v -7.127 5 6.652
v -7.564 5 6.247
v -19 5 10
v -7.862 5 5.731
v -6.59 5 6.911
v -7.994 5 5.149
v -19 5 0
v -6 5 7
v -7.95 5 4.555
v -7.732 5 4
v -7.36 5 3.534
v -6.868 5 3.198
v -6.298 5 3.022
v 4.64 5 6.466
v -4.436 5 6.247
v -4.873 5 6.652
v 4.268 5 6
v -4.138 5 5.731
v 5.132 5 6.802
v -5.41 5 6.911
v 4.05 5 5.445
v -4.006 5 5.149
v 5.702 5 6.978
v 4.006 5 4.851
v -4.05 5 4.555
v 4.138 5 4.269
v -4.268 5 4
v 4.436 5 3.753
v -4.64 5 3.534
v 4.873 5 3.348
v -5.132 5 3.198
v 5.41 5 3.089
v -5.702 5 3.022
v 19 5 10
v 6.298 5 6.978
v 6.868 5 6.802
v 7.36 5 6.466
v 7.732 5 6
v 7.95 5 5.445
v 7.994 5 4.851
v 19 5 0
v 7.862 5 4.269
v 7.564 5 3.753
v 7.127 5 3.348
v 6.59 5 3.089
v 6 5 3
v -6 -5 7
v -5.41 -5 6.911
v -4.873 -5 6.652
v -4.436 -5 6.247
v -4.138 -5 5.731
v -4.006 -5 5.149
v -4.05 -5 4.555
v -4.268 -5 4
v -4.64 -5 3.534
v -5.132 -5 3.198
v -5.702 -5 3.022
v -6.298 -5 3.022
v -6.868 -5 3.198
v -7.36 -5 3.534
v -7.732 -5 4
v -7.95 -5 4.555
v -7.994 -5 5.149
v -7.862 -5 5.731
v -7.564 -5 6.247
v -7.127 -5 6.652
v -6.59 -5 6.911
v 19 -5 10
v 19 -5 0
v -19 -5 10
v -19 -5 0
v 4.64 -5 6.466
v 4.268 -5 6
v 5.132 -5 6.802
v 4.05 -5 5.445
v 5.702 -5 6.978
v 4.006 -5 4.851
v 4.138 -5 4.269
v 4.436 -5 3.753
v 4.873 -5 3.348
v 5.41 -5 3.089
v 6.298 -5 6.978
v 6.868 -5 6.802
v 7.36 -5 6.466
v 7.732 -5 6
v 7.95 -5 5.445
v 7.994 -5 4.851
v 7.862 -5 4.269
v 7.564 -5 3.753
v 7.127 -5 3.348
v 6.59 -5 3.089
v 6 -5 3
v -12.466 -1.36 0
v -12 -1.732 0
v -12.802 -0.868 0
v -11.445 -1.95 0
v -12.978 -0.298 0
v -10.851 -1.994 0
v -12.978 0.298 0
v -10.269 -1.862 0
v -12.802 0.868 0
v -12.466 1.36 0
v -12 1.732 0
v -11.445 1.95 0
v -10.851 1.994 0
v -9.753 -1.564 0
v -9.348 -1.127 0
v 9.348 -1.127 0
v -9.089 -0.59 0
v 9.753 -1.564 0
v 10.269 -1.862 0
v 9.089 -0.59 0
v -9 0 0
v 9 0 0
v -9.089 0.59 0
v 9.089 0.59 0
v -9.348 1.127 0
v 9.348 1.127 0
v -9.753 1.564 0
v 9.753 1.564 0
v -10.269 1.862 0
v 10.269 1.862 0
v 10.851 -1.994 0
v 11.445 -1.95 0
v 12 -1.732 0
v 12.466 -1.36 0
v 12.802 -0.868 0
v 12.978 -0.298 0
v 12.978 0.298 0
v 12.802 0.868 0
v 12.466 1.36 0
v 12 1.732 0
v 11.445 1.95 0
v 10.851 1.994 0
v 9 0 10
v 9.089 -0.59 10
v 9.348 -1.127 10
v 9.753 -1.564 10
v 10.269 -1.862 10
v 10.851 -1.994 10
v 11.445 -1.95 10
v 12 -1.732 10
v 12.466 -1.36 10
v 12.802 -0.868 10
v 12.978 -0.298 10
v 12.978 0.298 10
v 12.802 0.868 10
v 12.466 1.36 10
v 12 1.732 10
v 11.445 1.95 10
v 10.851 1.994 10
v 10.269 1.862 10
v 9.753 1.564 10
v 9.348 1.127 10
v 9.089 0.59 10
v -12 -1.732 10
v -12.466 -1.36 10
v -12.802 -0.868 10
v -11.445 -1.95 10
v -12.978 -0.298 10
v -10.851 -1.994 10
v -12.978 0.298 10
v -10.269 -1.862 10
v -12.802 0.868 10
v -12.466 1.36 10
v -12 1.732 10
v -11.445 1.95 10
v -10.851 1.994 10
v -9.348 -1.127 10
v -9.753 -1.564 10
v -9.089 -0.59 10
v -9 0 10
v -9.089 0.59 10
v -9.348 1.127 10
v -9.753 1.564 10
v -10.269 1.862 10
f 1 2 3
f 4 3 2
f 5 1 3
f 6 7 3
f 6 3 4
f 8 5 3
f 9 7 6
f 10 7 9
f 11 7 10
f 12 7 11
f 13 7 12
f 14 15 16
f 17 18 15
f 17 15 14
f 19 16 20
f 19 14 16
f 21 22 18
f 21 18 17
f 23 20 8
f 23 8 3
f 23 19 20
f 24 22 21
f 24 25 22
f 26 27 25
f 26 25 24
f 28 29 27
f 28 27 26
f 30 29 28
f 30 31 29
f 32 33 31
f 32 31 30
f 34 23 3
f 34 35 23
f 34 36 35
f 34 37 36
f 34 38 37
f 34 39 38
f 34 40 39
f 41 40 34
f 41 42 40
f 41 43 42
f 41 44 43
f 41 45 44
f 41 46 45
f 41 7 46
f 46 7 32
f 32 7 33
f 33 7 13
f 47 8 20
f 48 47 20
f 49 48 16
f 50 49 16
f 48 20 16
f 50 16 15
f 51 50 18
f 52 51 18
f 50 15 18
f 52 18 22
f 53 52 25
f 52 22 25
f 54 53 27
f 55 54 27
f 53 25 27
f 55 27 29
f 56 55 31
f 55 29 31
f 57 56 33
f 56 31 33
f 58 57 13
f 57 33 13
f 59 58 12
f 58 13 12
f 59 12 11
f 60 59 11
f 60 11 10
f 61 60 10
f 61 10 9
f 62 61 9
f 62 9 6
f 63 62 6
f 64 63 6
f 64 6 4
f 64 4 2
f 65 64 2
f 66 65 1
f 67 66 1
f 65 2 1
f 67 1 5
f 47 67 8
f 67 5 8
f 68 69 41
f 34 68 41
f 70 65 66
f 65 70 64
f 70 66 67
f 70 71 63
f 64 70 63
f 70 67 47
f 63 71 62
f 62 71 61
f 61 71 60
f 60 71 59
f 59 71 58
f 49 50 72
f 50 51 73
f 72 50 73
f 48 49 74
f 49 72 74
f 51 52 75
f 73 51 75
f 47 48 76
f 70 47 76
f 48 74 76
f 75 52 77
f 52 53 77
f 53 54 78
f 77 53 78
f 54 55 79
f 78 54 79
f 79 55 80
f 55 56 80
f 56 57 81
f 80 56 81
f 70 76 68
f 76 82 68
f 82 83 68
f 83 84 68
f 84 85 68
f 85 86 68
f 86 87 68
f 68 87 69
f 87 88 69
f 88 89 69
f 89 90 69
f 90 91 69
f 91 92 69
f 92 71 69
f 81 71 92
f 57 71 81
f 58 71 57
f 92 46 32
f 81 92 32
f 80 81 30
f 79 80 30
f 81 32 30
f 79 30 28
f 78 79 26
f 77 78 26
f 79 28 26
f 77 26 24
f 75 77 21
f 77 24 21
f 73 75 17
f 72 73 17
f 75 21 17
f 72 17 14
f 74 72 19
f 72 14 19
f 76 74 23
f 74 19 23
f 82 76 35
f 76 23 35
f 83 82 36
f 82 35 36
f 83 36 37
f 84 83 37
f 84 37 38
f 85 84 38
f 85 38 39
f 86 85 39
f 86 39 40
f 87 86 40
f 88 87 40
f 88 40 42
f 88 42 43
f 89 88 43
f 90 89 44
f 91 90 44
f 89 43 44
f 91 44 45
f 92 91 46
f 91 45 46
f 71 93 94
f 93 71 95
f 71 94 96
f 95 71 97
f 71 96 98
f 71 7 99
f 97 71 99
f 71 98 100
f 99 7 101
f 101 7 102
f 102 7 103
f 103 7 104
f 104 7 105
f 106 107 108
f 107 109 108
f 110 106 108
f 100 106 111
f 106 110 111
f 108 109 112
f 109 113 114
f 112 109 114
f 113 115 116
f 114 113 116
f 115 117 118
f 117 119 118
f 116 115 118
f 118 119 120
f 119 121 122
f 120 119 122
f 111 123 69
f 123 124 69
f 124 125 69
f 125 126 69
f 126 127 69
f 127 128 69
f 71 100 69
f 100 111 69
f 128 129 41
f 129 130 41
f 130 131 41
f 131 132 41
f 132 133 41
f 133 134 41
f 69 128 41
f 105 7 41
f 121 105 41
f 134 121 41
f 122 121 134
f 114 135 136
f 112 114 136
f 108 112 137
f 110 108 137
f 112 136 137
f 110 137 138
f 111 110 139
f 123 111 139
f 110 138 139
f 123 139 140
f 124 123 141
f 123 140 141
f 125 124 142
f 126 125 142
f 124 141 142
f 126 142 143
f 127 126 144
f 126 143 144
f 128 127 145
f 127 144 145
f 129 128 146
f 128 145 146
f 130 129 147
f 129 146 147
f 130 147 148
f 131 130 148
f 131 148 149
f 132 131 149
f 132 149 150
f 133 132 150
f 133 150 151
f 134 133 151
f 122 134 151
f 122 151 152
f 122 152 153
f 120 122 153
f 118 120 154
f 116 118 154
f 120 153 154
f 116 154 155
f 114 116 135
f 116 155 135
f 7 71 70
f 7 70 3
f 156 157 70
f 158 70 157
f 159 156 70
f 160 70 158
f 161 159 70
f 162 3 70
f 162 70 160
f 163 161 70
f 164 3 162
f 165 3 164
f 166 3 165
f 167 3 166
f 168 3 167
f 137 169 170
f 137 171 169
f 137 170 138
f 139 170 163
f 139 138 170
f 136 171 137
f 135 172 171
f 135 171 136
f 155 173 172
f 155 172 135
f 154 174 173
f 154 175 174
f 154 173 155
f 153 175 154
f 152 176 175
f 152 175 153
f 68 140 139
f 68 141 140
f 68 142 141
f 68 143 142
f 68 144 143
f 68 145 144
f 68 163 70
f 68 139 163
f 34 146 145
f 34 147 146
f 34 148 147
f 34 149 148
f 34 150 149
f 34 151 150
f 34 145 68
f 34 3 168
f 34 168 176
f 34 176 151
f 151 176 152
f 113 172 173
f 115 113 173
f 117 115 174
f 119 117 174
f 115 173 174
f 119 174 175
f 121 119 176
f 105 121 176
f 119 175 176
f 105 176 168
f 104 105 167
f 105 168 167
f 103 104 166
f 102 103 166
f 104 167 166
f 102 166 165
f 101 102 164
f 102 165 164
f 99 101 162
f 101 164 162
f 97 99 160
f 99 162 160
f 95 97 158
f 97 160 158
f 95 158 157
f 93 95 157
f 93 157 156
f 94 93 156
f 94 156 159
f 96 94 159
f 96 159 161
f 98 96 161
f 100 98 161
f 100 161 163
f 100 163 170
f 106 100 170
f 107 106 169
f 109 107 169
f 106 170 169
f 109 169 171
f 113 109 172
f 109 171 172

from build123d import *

# Parameters (mm, degrees)
SKETCH_1_W          = 38
SKETCH_1_H          = 10
EXTRUDE_1_DEPTH     = 10
SKETCH_3_R          = 2
CUT_EXTRUDE_1_DEPTH = 10
SKETCH_4_R          = 2
CUT_EXTRUDE_2_DEPTH = 10


with BuildPart() as part:
    # 草图1 → 凸台-拉伸1 (new body)
    with BuildSketch(Plane.XY):
        Rectangle(SKETCH_1_W, SKETCH_1_H)
    extrude(amount=EXTRUDE_1_DEPTH)

    # 草图3 → 切除-拉伸1 (cut)
    with BuildSketch(Plane.XY.offset(10)):
        with Locations((-11, 0)):
            Circle(SKETCH_3_R)
        with Locations(Location((11, 0, 0), (0, 0, 180))):
            Circle(SKETCH_3_R)
    extrude(amount=-CUT_EXTRUDE_1_DEPTH, mode=Mode.SUBTRACT)

    # 草图4 → 切除-拉伸2 (cut)
    with BuildSketch(Plane(origin=(0, 5, 0), x_dir=(1, 0, 0), z_dir=(0, 1, 0))):
        with Locations(Location((-6, -5, 0), (0, 0, 270))):
            Circle(SKETCH_4_R)
        with Locations(Location((6, -5, 0), (0, 0, 90))):
            Circle(SKETCH_4_R)
    extrude(amount=-CUT_EXTRUDE_2_DEPTH, mode=Mode.SUBTRACT)


solid = part.part
